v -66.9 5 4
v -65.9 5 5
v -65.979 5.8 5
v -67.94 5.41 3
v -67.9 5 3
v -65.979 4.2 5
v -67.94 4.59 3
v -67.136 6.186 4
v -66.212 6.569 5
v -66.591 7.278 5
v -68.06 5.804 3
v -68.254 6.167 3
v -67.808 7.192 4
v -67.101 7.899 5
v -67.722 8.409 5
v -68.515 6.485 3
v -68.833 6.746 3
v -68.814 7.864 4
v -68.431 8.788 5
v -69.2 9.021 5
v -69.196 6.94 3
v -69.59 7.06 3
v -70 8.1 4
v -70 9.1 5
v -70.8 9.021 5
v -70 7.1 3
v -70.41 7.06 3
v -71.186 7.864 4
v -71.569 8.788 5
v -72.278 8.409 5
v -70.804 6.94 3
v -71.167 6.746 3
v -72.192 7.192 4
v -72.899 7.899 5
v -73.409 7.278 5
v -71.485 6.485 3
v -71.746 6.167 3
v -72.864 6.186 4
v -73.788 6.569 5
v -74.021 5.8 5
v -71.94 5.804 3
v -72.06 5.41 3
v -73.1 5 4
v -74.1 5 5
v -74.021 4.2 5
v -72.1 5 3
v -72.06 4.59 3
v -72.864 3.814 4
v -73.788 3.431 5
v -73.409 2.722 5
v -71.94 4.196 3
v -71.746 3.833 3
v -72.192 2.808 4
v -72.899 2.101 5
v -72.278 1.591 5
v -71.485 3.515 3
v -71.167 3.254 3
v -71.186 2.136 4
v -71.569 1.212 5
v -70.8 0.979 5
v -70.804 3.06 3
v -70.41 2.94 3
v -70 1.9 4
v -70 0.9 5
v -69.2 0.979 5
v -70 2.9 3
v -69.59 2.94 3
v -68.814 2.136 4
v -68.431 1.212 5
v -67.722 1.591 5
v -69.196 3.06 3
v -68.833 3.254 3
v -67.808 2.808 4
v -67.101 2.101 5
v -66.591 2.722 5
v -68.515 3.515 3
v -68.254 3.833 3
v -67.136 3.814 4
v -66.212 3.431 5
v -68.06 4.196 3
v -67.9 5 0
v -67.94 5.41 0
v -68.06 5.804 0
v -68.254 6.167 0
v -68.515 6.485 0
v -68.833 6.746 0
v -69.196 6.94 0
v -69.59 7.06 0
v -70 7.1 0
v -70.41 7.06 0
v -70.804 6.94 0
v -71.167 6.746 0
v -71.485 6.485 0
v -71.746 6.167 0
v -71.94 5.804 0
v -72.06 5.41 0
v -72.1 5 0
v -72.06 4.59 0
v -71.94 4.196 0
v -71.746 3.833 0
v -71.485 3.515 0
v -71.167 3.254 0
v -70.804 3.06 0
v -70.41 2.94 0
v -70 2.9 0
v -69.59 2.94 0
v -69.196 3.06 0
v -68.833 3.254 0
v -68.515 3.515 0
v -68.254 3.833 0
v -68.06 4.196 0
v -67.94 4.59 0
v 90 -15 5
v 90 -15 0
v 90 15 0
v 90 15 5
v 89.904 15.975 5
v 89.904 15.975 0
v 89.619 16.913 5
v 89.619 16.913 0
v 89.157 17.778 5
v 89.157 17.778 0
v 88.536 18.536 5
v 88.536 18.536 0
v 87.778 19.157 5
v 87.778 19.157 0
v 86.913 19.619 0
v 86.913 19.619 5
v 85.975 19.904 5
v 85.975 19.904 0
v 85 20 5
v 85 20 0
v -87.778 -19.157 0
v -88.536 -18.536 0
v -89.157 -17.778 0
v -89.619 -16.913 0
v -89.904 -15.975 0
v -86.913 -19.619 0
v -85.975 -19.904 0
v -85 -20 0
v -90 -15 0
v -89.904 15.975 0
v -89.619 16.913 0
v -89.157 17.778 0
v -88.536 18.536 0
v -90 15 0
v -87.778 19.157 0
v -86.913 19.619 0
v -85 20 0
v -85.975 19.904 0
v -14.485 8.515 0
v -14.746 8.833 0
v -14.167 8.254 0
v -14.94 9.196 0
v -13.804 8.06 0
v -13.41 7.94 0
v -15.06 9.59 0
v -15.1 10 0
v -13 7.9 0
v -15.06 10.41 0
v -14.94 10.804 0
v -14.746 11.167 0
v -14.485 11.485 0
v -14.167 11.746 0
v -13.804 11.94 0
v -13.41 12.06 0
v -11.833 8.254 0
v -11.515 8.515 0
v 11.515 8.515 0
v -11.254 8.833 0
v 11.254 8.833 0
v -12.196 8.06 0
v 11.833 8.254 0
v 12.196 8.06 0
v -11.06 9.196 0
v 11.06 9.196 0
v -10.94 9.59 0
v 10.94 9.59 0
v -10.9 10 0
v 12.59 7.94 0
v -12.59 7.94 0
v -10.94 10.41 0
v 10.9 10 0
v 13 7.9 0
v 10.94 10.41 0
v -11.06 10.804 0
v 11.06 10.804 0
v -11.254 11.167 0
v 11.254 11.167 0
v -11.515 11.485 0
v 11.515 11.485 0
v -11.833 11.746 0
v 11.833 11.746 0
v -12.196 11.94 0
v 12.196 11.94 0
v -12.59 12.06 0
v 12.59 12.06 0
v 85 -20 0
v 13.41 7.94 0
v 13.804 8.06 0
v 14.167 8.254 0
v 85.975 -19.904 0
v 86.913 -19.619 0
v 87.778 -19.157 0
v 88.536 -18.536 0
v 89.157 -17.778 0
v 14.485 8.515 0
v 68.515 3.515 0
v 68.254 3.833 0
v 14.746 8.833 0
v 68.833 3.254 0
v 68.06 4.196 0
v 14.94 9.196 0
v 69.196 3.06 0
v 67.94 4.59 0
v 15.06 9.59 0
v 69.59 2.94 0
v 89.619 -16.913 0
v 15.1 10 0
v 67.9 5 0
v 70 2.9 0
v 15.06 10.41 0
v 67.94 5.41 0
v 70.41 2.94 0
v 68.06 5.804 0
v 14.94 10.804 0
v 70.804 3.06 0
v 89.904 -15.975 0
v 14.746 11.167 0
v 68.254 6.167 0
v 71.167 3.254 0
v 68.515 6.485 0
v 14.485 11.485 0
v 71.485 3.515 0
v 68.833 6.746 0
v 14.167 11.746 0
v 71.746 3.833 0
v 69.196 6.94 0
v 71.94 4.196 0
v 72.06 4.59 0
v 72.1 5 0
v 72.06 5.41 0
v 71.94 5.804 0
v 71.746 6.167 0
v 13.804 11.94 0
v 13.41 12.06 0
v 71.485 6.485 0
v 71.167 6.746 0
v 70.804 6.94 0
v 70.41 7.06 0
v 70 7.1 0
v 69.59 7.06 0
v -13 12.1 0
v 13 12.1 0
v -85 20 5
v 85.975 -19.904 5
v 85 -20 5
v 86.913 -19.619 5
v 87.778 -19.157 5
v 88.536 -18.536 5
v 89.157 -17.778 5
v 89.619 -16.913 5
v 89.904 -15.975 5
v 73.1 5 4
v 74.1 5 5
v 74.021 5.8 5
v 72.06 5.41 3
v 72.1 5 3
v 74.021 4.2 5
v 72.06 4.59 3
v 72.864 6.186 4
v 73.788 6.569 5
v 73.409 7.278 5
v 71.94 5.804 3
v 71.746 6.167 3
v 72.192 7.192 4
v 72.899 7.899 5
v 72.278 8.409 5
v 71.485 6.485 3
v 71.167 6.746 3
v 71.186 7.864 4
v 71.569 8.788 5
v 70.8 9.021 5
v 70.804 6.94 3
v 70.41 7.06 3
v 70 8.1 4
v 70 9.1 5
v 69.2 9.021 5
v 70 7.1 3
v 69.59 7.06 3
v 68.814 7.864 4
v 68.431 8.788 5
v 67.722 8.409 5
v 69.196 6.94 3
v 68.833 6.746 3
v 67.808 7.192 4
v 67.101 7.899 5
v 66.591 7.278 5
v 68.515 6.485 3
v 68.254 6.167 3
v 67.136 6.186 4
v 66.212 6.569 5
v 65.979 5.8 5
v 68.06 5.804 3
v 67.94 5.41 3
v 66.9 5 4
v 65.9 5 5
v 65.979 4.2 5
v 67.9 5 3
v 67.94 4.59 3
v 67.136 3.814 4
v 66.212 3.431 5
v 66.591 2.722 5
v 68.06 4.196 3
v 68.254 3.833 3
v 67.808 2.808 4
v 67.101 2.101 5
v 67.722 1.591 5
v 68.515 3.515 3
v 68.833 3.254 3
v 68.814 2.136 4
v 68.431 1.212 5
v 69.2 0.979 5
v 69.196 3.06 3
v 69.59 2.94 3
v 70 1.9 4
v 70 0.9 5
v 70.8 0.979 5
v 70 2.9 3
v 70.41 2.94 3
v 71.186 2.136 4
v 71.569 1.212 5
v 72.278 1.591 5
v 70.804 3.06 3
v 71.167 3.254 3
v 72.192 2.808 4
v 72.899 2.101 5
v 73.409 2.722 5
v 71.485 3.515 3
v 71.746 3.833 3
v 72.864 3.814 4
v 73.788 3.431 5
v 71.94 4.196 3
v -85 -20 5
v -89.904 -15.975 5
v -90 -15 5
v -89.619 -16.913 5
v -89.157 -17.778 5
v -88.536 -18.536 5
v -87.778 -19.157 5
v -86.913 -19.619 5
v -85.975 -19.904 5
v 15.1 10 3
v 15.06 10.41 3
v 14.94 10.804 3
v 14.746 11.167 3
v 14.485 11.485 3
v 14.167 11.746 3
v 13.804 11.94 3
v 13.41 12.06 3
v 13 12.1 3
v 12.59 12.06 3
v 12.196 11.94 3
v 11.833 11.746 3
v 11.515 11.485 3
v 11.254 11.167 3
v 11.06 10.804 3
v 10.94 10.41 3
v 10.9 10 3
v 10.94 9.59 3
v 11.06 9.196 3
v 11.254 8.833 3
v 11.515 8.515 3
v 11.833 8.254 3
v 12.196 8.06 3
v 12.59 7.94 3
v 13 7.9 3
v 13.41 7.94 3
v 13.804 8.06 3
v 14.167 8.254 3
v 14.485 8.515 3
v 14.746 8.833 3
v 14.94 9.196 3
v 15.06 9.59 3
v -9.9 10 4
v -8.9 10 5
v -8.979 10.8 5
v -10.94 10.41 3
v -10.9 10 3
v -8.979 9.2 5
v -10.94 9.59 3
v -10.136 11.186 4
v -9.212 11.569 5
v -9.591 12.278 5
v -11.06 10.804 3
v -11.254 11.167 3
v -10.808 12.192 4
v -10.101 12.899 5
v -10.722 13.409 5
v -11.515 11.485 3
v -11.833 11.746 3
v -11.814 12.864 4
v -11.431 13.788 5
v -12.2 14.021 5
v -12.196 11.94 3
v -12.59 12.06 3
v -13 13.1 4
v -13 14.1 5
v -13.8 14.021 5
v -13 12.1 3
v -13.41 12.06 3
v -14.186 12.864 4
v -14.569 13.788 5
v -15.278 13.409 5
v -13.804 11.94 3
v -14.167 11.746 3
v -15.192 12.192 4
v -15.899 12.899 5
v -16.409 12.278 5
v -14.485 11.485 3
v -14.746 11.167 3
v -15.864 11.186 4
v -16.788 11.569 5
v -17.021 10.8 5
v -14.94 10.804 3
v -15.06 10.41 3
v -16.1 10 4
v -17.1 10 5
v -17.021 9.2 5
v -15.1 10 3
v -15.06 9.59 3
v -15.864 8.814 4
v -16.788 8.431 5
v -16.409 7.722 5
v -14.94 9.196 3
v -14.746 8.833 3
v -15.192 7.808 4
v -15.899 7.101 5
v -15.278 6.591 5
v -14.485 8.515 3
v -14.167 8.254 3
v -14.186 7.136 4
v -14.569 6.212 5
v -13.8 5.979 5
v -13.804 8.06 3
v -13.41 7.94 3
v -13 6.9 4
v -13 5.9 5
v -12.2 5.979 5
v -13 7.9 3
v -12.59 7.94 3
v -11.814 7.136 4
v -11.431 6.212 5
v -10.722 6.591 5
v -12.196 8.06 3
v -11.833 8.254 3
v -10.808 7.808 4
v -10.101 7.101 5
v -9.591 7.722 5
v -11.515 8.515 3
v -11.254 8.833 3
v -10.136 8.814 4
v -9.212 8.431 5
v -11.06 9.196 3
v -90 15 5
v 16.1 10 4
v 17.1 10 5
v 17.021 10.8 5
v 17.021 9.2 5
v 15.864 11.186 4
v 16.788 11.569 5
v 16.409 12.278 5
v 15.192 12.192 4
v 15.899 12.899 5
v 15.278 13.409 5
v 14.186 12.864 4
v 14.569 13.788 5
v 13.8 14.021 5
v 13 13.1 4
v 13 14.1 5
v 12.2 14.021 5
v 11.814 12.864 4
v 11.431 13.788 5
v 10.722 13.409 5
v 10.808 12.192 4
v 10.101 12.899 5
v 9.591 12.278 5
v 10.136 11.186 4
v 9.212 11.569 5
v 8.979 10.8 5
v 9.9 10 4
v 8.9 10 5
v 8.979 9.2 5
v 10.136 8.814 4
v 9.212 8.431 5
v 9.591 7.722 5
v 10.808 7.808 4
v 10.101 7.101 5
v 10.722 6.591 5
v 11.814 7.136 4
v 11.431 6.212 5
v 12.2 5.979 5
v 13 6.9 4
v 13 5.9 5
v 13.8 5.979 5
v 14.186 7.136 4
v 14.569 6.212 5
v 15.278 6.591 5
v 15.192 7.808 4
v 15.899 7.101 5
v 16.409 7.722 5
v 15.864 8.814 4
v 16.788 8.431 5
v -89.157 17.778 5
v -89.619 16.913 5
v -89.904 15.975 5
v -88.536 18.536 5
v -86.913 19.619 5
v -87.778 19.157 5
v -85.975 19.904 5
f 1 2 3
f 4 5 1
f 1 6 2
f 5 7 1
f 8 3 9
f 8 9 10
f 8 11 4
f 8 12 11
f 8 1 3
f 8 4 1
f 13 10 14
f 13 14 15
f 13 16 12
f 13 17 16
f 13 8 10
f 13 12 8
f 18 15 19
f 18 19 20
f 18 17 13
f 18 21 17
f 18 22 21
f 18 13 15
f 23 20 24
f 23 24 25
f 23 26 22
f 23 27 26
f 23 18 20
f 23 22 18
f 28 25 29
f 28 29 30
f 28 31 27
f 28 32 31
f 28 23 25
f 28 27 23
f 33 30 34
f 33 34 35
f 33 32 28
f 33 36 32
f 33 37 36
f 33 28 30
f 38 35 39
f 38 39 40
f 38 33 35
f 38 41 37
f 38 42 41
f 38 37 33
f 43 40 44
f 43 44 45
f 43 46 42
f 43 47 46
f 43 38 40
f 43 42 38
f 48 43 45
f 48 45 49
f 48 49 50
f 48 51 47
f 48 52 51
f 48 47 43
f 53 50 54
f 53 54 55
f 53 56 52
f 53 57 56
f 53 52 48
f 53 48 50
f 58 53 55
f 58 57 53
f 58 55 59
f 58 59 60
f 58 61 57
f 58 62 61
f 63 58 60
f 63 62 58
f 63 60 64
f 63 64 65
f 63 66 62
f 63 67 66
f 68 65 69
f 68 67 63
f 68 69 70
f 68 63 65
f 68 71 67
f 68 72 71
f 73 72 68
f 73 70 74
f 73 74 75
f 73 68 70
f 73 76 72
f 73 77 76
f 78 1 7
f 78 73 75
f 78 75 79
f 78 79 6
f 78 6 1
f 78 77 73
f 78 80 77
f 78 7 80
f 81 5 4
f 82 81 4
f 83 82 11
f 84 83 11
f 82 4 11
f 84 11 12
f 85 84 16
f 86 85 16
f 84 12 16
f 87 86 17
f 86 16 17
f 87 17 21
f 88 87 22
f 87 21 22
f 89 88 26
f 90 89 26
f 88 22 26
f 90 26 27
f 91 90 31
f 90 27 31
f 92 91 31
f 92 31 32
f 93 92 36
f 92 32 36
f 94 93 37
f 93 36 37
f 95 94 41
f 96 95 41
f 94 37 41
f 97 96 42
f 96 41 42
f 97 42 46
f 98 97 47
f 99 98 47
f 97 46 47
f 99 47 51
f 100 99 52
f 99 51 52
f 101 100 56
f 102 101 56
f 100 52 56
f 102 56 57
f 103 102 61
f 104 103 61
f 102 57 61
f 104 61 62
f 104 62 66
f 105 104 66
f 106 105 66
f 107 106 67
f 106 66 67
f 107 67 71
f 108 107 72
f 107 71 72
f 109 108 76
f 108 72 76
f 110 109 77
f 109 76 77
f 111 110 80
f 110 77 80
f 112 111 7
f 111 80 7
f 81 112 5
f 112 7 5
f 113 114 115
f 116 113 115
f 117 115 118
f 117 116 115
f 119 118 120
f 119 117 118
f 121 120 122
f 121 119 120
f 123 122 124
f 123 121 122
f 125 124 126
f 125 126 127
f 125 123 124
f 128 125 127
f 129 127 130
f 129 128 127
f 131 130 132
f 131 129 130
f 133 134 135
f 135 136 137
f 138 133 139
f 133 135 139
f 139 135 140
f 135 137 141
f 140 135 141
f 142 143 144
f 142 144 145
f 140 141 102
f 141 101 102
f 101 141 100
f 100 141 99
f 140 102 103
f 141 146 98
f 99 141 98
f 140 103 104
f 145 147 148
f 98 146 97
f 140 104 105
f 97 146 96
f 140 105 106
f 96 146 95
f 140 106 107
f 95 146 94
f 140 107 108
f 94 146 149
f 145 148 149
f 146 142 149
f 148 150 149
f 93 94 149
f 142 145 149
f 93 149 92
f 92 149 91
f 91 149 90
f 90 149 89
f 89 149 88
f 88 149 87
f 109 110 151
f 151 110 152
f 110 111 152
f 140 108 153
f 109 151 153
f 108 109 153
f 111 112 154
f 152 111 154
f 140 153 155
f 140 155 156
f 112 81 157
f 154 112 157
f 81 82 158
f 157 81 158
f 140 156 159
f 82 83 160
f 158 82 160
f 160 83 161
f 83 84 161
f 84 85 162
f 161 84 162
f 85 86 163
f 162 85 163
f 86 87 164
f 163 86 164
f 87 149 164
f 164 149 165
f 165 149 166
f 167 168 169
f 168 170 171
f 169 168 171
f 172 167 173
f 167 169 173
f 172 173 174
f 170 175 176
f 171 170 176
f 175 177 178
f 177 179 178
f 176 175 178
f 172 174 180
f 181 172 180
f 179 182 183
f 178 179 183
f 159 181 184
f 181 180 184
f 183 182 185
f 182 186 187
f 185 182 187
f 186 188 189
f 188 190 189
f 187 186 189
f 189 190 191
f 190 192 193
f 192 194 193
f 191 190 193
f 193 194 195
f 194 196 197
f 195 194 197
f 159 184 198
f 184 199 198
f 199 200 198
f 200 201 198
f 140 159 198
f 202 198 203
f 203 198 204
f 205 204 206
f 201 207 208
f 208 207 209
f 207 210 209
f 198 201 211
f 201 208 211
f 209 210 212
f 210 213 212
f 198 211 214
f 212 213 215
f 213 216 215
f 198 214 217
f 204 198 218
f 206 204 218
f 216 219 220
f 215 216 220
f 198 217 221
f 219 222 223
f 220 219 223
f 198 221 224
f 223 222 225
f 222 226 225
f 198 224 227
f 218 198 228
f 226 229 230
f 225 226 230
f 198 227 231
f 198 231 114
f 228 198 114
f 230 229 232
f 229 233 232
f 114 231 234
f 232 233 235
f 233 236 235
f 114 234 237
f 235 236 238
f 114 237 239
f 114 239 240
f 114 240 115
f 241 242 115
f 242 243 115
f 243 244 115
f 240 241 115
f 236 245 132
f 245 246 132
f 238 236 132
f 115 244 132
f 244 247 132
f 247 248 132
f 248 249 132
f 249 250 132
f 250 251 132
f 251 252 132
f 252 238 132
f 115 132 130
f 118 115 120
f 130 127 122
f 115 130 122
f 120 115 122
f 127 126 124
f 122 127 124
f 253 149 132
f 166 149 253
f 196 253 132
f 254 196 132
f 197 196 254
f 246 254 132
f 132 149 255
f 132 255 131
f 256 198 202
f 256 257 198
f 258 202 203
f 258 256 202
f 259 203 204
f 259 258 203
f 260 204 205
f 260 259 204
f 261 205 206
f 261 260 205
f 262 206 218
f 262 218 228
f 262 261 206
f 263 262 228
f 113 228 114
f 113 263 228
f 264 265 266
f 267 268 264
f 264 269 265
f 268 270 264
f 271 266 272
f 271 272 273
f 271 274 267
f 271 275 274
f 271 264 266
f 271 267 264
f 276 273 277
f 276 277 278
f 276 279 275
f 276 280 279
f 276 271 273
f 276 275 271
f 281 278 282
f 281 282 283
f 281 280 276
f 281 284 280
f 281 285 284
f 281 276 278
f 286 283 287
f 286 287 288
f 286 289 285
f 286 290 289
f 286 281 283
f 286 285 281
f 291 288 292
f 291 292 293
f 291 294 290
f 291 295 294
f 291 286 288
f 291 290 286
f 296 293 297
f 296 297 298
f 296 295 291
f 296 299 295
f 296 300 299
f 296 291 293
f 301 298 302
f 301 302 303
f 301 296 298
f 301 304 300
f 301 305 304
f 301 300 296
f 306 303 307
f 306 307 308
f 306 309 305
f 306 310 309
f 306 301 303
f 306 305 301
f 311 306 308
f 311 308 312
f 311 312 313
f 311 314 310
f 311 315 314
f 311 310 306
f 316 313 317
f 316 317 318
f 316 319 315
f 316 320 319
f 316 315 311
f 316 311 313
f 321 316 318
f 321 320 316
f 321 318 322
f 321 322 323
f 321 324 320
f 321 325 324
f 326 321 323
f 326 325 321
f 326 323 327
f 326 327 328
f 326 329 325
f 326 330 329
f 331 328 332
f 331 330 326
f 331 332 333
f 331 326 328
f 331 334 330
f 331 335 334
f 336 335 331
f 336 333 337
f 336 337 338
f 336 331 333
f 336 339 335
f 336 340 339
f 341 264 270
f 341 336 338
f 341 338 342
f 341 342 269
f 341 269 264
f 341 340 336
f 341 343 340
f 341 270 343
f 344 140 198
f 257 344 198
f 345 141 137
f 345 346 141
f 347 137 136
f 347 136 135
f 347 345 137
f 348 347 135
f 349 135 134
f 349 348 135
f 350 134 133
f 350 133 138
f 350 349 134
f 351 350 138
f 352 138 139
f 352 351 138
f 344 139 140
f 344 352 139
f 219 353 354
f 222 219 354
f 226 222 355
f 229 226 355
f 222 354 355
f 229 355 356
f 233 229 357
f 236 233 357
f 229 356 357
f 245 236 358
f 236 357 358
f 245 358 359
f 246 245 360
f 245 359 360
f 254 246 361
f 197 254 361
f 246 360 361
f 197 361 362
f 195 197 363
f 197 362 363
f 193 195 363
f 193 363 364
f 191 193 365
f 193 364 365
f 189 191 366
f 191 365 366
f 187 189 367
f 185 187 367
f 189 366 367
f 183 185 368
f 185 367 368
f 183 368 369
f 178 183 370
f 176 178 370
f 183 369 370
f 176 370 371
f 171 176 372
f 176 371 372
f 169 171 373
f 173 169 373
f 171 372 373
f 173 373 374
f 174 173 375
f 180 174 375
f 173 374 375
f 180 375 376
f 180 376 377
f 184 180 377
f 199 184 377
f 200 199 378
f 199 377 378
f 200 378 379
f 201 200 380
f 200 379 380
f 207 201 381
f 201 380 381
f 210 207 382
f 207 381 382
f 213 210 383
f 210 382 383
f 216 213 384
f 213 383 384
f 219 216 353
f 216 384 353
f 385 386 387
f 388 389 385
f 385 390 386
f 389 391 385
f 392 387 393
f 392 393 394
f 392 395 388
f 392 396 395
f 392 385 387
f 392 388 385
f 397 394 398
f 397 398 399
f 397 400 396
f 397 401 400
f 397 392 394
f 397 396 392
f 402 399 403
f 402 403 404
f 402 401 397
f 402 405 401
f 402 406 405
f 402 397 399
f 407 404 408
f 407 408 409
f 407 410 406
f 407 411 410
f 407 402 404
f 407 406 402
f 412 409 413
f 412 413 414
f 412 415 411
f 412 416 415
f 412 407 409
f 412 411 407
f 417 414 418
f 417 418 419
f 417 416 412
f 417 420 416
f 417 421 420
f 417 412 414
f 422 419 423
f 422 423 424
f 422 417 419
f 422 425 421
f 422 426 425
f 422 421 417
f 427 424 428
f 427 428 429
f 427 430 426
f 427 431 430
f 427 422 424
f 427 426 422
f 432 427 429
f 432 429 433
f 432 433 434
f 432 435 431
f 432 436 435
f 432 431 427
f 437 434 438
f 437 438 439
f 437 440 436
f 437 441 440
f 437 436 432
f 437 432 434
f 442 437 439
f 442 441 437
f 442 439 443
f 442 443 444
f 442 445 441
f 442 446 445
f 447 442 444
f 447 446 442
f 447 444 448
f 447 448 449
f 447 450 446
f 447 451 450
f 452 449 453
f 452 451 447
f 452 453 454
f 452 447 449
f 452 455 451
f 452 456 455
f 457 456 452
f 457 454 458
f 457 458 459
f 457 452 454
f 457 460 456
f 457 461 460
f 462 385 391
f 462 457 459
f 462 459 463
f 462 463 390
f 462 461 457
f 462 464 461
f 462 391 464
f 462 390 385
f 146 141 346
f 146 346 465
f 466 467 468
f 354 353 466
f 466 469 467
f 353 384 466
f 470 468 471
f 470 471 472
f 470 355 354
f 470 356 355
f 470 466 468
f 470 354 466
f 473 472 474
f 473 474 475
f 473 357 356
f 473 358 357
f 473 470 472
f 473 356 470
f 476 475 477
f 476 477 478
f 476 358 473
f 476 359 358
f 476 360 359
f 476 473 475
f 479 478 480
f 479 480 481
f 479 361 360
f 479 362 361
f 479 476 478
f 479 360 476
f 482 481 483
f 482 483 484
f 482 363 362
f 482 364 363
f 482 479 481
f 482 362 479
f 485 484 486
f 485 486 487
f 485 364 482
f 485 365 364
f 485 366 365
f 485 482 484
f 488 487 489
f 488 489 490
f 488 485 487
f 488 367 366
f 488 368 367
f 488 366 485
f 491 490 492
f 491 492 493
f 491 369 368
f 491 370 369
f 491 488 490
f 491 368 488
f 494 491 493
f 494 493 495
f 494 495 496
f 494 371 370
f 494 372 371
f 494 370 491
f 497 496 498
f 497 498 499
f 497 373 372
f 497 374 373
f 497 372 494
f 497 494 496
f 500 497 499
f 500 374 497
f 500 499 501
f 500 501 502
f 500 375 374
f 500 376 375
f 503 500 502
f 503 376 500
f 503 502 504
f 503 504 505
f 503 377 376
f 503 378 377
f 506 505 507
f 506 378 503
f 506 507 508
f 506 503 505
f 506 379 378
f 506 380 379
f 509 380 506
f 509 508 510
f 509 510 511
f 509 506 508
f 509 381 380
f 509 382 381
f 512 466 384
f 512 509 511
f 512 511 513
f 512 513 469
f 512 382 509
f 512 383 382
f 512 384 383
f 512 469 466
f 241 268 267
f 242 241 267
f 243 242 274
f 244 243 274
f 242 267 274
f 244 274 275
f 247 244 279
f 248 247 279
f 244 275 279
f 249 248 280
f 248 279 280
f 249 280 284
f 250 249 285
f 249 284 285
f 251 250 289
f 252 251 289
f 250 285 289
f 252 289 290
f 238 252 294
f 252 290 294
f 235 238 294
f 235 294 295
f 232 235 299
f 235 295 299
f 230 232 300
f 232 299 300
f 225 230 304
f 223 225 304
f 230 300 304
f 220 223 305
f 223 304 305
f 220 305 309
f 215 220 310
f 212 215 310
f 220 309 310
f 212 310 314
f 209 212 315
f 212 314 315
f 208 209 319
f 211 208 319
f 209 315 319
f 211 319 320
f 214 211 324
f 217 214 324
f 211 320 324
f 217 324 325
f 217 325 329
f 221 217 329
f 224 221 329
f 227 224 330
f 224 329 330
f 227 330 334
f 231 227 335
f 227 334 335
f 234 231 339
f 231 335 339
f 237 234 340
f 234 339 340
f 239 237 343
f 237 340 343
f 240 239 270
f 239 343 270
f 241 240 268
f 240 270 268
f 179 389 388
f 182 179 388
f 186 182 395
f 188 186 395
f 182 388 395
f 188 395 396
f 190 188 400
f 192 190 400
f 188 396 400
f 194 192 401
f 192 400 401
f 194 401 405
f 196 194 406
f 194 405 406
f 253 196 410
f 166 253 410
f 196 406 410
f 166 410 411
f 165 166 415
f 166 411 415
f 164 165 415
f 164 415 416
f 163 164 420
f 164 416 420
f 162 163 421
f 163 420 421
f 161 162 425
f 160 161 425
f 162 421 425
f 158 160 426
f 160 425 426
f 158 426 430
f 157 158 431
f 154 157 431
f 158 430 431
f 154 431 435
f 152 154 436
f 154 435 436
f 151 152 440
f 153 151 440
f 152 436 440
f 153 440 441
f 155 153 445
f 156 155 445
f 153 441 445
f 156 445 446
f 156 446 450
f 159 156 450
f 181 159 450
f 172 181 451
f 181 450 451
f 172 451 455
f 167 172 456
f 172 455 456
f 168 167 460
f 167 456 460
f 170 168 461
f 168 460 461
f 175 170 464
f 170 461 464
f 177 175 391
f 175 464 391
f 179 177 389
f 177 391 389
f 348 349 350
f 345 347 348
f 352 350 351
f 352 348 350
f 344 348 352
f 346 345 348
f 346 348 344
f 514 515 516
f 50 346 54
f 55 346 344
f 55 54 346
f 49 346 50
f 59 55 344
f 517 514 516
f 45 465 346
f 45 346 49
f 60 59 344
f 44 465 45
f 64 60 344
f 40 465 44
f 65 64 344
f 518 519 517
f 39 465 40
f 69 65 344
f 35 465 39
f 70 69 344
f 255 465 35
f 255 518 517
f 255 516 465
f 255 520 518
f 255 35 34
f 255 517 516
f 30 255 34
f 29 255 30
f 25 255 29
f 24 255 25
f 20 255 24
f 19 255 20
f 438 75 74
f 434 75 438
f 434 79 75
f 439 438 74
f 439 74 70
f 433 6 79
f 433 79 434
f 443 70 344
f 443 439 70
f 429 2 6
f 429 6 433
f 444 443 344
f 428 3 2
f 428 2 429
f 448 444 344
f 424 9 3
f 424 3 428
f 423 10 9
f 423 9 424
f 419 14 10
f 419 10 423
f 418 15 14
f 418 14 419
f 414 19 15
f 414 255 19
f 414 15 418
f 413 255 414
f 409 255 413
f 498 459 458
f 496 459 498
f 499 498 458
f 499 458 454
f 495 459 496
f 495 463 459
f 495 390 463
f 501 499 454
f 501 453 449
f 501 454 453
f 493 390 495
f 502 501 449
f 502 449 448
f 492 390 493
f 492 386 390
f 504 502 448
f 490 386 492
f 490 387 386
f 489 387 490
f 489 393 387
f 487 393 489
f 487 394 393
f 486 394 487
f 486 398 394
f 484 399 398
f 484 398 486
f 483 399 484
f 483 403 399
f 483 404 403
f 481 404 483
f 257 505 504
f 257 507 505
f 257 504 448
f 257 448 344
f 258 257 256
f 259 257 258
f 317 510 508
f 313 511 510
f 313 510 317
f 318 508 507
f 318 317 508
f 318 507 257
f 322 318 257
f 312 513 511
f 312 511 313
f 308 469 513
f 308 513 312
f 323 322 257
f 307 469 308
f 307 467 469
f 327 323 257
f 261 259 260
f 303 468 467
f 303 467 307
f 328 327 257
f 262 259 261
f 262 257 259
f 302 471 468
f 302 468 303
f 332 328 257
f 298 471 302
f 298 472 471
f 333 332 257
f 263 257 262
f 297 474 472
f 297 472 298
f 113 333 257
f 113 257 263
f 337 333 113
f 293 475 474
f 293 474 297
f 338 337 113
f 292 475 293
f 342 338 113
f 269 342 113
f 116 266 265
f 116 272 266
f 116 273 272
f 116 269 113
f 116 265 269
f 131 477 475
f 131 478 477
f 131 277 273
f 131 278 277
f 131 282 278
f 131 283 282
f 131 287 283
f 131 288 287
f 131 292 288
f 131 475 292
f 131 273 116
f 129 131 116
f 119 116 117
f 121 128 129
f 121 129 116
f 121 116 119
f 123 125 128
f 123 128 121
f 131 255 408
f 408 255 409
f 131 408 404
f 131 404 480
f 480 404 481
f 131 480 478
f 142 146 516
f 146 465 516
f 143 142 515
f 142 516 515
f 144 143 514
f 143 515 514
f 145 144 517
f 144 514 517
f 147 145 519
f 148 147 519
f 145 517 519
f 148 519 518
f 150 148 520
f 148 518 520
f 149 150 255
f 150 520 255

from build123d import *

# Parameters (mm, degrees)
SZKIC1_W                    = 180
SZKIC1_H                    = 40
DODANIE_WYCI_GNI_CIE1_DEPTH = 5
ZAOKR_GLENIE1_R             = 5
SZKIC2_R                    = 2.1
WYTNIJ_WYCI_GNI_CIE1_DEPTH  = 5
SFAZOWANIE1_SIZE            = 2


with BuildPart() as part:
    # Szkic1 → Dodanie-wyciągnięcie1 (new body)
    with BuildSketch(Plane.XY):
        Rectangle(SZKIC1_W, SZKIC1_H)
    extrude(amount=DODANIE_WYCI_GNI_CIE1_DEPTH)

    # Zaokrąglenie1
    zaokr_glenie1_edges = [part.edges().sort_by_distance(p)[0] for p in [
        (90, -20, 2.5),
        (-90, -20, 2.5),
        (-90, 20, 2.5),
        (90, 20, 2.5),
    ]]
    fillet(zaokr_glenie1_edges, radius=ZAOKR_GLENIE1_R)

    # Szkic2 → Wytnij-wyciągnięcie1 (cut)
    with BuildSketch(Plane.XY.offset(5)):
        with Locations((-70, 5)):
            Circle(SZKIC2_R)
        with Locations((-13, 10)):
            Circle(SZKIC2_R)
        with Locations((13, 10)):
            Circle(SZKIC2_R)
        with Locations((70, 5)):
            Circle(SZKIC2_R)
    extrude(amount=-WYTNIJ_WYCI_GNI_CIE1_DEPTH, mode=Mode.SUBTRACT)

    # Sfazowanie1
    sfazowanie1_edges = [part.edges().sort_by_distance(p)[0] for p in [
        (-72.1, 5, 5),
        (-15.1, 10, 5),
        (10.9, 10, 5),
        (67.9, 5, 5),
    ]]
    chamfer(sfazowanie1_edges, length=SFAZOWANIE1_SIZE)


solid = part.part
